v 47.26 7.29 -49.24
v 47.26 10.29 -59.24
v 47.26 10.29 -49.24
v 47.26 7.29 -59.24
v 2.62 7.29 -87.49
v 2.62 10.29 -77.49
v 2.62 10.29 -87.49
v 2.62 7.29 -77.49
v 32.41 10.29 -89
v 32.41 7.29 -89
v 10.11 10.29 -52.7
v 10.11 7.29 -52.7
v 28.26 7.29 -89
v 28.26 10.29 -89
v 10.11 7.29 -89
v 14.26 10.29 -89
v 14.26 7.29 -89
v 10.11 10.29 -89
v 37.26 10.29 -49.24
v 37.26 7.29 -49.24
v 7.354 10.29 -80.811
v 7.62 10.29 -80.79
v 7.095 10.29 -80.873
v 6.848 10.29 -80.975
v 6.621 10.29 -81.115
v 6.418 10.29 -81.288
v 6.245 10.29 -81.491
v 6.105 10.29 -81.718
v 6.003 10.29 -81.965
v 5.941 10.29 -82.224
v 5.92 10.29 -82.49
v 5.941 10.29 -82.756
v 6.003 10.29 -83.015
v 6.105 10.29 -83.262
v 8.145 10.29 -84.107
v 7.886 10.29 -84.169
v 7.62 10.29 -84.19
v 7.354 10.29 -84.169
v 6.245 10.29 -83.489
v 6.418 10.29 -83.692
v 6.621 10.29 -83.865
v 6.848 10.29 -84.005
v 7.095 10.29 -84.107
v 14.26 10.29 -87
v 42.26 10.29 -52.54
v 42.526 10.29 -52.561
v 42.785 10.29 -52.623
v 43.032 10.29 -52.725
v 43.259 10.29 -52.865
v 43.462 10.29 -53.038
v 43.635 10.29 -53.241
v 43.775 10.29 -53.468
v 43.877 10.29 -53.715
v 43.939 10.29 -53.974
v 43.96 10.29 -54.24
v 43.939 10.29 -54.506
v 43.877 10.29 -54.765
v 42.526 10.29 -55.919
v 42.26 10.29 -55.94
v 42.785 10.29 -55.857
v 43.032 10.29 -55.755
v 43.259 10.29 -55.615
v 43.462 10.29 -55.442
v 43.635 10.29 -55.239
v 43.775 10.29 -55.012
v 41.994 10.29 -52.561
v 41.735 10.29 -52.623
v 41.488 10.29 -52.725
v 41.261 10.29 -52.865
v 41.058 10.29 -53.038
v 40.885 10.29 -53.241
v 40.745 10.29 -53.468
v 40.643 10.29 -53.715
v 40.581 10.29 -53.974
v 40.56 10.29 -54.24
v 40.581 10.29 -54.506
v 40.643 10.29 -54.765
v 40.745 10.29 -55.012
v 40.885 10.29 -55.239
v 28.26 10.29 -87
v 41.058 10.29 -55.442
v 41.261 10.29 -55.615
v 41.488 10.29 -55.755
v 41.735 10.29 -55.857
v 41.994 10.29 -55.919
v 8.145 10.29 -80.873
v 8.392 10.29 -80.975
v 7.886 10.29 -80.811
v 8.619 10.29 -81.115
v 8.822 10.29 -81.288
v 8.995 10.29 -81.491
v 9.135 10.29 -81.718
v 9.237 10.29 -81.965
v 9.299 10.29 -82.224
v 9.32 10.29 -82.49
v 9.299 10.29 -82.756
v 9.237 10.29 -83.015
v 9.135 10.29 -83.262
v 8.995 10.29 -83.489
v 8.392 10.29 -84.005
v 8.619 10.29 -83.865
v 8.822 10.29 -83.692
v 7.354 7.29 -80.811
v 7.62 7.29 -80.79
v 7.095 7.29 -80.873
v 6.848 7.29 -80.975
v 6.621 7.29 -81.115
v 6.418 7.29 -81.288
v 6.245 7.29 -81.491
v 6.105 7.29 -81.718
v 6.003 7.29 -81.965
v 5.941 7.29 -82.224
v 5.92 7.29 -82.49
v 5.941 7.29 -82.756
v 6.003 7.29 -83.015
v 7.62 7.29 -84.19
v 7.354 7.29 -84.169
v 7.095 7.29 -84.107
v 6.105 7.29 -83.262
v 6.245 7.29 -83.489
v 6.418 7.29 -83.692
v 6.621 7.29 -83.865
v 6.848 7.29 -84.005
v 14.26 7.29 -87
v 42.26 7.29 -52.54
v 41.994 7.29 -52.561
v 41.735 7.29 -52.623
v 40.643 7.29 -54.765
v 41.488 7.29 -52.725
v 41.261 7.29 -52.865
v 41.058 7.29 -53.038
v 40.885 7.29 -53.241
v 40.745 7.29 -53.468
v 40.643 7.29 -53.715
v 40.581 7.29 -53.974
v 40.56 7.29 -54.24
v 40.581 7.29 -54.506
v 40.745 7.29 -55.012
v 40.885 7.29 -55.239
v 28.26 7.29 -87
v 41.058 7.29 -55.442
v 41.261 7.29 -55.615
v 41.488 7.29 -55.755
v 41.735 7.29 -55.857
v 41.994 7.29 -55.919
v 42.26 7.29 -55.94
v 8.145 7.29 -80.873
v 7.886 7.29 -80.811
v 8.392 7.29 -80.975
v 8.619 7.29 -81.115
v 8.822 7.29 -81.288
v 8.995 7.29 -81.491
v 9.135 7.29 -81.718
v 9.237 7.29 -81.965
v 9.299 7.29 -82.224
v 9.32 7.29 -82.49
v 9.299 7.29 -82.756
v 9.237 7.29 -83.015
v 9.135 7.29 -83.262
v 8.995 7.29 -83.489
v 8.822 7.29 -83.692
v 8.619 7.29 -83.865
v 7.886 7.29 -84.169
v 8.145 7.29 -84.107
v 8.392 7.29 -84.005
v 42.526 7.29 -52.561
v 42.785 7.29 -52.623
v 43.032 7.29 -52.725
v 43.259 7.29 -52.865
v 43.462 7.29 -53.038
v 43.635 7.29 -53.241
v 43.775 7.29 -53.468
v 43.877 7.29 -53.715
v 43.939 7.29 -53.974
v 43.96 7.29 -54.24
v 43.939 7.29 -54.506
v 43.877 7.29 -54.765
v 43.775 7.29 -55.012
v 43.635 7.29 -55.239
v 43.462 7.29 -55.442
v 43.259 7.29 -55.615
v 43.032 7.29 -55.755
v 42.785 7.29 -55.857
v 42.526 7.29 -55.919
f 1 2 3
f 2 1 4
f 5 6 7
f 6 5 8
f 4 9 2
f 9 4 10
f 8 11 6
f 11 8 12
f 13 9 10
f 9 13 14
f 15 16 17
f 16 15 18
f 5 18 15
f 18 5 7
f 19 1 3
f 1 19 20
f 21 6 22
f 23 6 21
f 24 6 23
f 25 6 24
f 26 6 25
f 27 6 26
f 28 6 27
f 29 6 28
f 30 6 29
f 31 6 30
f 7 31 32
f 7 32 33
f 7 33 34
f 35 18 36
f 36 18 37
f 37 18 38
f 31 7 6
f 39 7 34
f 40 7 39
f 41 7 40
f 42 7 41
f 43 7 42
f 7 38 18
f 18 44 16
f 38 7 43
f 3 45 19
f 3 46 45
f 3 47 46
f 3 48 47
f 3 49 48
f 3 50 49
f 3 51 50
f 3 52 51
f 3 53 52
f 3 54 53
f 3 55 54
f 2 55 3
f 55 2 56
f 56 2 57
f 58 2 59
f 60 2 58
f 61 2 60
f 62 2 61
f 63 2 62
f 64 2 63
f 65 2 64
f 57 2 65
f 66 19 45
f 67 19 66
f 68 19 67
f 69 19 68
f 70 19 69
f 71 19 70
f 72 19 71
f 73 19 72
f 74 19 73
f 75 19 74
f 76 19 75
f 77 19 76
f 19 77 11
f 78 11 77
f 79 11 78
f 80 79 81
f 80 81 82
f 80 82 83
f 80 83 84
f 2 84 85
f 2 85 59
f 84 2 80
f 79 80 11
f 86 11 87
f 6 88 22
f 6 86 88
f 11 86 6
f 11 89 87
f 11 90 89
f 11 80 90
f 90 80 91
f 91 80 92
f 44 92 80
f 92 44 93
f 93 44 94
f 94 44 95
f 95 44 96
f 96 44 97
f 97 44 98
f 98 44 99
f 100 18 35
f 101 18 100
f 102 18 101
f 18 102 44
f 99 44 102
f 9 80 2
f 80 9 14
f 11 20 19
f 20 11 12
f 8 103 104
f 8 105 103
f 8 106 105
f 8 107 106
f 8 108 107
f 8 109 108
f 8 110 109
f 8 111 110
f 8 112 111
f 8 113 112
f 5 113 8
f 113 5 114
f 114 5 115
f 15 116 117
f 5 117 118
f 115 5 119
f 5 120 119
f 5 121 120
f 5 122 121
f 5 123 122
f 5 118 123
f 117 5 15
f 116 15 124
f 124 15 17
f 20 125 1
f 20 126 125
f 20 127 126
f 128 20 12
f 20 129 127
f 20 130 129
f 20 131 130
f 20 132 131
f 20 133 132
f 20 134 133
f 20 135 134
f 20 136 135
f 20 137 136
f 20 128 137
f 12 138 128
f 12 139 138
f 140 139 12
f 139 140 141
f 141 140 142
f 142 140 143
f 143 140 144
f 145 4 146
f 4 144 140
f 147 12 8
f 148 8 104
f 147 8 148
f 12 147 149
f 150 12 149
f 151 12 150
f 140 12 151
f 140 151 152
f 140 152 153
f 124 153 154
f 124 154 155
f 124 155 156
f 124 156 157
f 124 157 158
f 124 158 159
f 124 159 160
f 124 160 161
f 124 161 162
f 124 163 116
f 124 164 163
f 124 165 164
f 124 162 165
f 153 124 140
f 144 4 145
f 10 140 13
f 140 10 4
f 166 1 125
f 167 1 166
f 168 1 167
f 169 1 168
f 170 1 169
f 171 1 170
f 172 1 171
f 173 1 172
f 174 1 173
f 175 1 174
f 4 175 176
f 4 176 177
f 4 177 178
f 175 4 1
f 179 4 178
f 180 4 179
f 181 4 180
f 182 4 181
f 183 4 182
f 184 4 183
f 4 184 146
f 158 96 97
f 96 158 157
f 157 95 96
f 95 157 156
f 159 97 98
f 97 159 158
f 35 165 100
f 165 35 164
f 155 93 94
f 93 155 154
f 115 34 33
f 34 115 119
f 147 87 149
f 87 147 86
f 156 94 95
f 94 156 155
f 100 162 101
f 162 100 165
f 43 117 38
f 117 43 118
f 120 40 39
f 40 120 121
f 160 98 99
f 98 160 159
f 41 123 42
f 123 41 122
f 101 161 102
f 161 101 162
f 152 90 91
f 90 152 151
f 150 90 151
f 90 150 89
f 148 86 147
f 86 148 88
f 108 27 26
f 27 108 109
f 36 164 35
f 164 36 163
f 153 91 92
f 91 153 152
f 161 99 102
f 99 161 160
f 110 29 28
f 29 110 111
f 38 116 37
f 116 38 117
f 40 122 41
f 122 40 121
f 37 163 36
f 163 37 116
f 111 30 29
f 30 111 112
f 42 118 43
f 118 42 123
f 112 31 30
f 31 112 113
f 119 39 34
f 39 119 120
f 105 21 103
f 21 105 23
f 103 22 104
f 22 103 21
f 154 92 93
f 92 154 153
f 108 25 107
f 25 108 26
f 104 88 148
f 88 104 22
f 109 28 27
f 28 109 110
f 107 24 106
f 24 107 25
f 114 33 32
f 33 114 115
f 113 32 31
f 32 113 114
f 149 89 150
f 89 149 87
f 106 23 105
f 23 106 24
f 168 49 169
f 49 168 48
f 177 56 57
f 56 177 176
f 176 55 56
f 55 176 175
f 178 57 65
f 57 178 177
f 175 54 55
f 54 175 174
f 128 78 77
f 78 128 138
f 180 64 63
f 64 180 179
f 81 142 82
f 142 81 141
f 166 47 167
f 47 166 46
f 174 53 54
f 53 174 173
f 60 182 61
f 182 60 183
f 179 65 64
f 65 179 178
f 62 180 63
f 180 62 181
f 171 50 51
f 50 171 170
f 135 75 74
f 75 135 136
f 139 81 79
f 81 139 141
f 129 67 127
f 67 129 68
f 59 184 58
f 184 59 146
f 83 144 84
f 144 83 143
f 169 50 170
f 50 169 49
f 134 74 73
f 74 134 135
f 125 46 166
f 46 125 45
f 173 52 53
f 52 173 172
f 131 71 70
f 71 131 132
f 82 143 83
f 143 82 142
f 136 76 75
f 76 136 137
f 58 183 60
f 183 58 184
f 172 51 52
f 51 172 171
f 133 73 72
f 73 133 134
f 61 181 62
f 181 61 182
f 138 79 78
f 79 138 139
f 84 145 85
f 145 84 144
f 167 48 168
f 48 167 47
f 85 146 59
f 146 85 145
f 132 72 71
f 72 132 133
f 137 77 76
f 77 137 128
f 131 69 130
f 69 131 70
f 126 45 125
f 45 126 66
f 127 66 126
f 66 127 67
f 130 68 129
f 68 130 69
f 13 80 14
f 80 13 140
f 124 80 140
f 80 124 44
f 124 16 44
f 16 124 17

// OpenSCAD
// SuperMini nRF52840 — FLAT HOLDER for Scylla (Elite-C-Holder 2.0 style).  v7 (2026-07-15)
// Flat plate rests on TWO case standoffs B + B2 (both collar-top y=7.29), screwed down (M3).
// The board is held on the plate's UNDERSIDE, component/USB side DOWN, so the USB-C drops to
// ~y4.4 and registers to the wall slot (21.26, 4.62). Case frame, Y-up.
$fn = 40;

// ---- measured case refs (STL) ----
usb    = [21.26, 4.62];    // USB-C slot centre
wall_z = -90.3;            // -Z outer wall
inner  = wall_z + 2.3;     // inner wall face (-88.0)
rest   = 7.29;             // standoff collar top (plate bottom rests here)
mB     = [7.62, -82.49];   // standoff B  (near wall)
mB2    = [42.26, -54.24];  // standoff B2 (deeper in)

// ---- board (SuperMini, user-measured 17.91 x 33.90) ----
bw = 18.3; bl = 34.3;      // + clearance
bx = usb[0] - bw/2;        // board left x  (USB centred on slot)
bz = inner;                // board USB edge at the inner wall
pt   = 3.0;                // plate thickness (v8: thicker = rigid, warps less)

// v8: SOLID plate, NO walls. Every wall/lip version failed at the SAME layer (plate->wall transition:
// thin isolated walls on a warp-prone thin plate). This version validates the MOUNT (fits + bolts to
// B+B2 + USB aligns) as a bulletproof solid plate; board retention added AFTER the mount is confirmed.
module flat_holder(){
  difference(){
    union(){
      // ---- plate: hull over the board area + the 2 mount tabs (SOLID, no walls) ----
      hull(){
        translate([bx-2,    rest, bz-1])    cube([bw+4, pt, bl+2]);   // over board
        translate([mB[0]-5, rest, mB[1]-5]) cube([10, pt, 10]);       // tab -> B
        translate([mB2[0]-5,rest, mB2[1]-5])cube([10, pt, 10]);       // tab -> B2
      }
    }
    // ---- 2x M3 screw holes (down through into the standoff inserts) ----
    translate([mB[0],  rest-1, mB[1]])  rotate([-90,0,0]) cylinder(d=3.4, h=pt+2);
    translate([mB2[0], rest-1, mB2[1]]) rotate([-90,0,0]) cylinder(d=3.4, h=pt+2);
    // ---- keep the USB edge open (board front pokes -Z to the wall) ----
    translate([usb[0]-7, rest-1, bz-4]) cube([14, pt+2, 5]);
  }
}
flat_holder();
